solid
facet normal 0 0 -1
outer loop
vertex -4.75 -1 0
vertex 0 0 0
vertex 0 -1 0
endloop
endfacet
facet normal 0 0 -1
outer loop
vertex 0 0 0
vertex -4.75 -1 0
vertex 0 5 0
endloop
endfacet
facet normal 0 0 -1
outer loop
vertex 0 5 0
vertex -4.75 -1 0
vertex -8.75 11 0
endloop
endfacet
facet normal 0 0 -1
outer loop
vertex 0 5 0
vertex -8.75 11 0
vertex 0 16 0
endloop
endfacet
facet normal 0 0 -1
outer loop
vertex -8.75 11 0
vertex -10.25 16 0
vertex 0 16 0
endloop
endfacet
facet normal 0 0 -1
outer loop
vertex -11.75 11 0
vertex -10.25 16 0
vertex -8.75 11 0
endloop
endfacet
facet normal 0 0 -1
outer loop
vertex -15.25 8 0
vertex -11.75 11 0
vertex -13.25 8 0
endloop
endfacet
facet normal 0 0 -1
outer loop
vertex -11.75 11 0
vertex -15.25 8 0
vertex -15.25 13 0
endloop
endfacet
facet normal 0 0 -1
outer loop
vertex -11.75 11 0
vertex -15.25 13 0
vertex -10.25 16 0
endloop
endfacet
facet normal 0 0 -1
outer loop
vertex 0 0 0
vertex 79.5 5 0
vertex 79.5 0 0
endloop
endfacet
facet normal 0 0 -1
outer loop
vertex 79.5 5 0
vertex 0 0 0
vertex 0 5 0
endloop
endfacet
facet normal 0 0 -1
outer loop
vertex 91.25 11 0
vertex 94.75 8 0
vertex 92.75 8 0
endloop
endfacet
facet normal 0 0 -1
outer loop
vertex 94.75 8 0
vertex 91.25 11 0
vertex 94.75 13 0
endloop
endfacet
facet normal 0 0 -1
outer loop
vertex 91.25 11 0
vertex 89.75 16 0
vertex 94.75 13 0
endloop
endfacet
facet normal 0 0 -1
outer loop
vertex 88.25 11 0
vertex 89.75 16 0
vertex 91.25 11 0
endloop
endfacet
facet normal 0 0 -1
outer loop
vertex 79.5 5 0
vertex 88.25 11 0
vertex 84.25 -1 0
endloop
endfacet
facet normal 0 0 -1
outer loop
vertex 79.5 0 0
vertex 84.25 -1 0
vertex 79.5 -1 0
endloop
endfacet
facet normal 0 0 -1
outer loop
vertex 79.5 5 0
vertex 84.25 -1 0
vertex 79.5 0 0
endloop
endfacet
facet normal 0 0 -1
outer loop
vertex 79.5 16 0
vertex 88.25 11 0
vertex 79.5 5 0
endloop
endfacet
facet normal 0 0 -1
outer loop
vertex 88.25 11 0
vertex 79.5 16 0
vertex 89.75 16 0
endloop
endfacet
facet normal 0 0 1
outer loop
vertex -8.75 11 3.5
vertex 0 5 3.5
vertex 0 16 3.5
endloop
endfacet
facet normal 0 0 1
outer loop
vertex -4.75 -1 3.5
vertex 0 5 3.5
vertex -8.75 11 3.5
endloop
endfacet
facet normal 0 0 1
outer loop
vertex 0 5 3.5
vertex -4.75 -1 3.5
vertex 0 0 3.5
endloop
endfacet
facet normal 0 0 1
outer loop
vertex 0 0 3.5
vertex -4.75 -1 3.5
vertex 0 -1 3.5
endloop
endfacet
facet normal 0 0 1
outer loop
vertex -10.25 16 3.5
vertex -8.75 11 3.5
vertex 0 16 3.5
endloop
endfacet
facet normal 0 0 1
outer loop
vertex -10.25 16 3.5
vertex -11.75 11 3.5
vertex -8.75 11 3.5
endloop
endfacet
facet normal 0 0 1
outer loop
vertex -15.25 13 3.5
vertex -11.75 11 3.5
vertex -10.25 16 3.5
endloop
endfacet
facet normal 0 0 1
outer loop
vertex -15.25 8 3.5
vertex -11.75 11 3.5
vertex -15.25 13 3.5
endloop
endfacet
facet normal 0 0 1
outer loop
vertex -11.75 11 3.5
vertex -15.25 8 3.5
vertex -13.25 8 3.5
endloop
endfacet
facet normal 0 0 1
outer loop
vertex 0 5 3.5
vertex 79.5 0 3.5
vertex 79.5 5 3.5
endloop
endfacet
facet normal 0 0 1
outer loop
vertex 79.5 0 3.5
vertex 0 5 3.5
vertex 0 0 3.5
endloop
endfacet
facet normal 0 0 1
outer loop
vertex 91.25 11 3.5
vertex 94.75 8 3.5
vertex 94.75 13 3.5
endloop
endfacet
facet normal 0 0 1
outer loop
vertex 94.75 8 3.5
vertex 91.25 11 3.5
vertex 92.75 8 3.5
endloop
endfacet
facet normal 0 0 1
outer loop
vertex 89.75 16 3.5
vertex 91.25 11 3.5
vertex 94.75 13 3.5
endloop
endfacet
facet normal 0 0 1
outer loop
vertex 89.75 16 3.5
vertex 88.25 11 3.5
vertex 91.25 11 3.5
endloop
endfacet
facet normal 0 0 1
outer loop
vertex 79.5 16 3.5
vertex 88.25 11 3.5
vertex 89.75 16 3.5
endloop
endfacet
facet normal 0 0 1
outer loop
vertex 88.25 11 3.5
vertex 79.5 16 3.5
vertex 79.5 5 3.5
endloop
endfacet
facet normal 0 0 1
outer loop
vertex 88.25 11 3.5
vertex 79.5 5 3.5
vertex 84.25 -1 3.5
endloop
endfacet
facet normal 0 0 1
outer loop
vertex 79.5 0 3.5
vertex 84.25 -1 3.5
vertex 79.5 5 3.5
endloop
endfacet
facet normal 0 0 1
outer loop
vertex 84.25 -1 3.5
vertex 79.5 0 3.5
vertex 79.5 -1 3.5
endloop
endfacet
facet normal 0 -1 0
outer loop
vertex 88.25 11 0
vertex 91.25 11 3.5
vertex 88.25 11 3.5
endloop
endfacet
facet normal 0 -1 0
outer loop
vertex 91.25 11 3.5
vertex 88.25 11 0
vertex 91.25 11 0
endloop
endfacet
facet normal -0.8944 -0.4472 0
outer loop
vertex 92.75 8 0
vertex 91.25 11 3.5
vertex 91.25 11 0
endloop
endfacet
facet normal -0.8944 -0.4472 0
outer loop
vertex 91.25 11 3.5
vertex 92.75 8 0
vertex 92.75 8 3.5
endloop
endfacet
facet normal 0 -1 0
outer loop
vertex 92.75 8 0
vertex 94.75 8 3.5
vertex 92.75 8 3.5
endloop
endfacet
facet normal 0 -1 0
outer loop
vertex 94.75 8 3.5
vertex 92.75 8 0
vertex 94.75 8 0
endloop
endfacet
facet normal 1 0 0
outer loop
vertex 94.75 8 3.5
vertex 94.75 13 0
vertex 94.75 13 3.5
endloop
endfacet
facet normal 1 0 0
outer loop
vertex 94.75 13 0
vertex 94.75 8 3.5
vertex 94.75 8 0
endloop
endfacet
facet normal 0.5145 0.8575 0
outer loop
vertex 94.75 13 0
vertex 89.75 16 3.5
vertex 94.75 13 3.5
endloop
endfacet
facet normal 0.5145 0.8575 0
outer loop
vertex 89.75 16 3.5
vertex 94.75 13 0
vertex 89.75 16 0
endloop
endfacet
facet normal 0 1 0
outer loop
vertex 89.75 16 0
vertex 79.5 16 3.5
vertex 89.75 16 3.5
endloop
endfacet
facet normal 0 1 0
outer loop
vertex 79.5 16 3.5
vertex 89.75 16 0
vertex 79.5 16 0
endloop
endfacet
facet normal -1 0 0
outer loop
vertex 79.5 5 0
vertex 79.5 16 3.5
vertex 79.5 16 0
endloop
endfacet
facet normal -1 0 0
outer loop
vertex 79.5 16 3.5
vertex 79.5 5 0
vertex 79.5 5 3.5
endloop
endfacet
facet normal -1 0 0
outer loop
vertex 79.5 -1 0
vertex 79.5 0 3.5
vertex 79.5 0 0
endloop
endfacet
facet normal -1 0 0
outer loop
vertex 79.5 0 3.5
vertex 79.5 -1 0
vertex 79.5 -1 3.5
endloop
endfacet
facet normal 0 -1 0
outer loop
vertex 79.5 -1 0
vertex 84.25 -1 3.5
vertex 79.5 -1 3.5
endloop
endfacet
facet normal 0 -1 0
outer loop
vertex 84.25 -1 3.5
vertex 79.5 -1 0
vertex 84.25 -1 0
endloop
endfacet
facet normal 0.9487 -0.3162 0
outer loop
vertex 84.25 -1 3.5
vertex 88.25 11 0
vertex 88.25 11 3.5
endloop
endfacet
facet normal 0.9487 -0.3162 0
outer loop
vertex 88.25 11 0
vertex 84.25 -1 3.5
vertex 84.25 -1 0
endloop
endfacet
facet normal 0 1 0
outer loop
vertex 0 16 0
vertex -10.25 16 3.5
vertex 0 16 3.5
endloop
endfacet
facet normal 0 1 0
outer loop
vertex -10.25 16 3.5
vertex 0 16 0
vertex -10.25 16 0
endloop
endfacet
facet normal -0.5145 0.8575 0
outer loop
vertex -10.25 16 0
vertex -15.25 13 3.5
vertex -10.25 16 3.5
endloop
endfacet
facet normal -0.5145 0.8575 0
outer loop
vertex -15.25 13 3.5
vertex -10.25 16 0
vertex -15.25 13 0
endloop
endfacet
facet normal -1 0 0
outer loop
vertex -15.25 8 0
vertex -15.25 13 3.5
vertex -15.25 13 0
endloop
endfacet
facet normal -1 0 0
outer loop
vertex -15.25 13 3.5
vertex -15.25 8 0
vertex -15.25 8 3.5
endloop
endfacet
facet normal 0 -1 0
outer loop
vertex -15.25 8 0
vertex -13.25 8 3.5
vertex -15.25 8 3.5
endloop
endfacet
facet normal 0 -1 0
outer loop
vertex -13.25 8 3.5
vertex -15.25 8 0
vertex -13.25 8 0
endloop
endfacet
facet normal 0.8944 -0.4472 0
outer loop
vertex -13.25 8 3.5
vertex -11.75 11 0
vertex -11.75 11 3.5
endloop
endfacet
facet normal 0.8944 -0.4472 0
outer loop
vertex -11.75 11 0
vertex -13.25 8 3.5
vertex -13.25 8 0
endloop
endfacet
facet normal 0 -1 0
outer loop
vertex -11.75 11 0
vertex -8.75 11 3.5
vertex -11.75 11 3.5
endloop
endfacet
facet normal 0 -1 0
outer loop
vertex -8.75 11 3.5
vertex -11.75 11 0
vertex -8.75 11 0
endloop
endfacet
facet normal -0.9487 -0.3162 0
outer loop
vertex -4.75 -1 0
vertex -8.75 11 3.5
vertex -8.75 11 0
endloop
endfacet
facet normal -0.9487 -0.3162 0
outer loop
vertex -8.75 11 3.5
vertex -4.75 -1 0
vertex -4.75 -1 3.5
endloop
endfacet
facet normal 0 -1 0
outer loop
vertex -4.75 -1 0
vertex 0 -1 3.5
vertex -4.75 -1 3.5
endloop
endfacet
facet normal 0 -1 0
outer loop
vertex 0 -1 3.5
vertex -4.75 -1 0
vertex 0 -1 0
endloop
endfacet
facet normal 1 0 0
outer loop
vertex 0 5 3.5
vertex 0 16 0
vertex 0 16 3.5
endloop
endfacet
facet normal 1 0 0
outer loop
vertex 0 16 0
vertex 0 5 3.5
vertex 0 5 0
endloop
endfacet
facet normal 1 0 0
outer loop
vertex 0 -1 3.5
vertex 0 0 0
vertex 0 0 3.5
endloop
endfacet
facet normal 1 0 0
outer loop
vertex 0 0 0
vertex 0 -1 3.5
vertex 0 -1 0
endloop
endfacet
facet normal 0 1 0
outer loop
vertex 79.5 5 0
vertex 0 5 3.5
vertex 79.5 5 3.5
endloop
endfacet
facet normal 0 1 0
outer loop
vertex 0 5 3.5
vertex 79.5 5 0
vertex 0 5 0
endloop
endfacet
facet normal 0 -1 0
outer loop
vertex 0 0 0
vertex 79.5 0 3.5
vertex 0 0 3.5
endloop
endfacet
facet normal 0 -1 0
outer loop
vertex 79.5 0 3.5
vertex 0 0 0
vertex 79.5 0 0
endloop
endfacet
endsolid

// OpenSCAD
wh = 79.5;        // width of holder
ws = 100;       // center distance of struds
ds = 3;         // diameter of struds
hh = 11;        // height of holder
dh = 5;         // heigh difference of struds and holder

d=3.5;

b=((ws-wh)/2);    // helper for distance of hole


poly=[[0,-1],[0,hh+dh],[b,hh+dh],[b+5,hh+2],[b+5,hh-3],
[b+3,hh-3],[b+ds/2,hh],[b-ds/2,hh],[b-ds/2-4,-1]];

color("blue")linear_extrude(height=d, center =false)translate([wh,0,0])polygon(poly);

color("green")linear_extrude(height=d, center =false)scale([-1,1,1])polygon(poly);

color("red")cube([wh,dh,d]);




module old(){
difference(){
    cube([115,18,3],center=false);
    translate([18.5,8,-0.1])cube([78,11,5],center=false);
    translate([-1,-1,-1])cube([10,9,7],center=false);
    translate([6,0,-1])cube([3,13,7],center=false);
    translate([106,-1,-1])cube([10,9,7],center=false);
    translate([106,0,-1])cube([3,13,7],center=false);
    
}
}
